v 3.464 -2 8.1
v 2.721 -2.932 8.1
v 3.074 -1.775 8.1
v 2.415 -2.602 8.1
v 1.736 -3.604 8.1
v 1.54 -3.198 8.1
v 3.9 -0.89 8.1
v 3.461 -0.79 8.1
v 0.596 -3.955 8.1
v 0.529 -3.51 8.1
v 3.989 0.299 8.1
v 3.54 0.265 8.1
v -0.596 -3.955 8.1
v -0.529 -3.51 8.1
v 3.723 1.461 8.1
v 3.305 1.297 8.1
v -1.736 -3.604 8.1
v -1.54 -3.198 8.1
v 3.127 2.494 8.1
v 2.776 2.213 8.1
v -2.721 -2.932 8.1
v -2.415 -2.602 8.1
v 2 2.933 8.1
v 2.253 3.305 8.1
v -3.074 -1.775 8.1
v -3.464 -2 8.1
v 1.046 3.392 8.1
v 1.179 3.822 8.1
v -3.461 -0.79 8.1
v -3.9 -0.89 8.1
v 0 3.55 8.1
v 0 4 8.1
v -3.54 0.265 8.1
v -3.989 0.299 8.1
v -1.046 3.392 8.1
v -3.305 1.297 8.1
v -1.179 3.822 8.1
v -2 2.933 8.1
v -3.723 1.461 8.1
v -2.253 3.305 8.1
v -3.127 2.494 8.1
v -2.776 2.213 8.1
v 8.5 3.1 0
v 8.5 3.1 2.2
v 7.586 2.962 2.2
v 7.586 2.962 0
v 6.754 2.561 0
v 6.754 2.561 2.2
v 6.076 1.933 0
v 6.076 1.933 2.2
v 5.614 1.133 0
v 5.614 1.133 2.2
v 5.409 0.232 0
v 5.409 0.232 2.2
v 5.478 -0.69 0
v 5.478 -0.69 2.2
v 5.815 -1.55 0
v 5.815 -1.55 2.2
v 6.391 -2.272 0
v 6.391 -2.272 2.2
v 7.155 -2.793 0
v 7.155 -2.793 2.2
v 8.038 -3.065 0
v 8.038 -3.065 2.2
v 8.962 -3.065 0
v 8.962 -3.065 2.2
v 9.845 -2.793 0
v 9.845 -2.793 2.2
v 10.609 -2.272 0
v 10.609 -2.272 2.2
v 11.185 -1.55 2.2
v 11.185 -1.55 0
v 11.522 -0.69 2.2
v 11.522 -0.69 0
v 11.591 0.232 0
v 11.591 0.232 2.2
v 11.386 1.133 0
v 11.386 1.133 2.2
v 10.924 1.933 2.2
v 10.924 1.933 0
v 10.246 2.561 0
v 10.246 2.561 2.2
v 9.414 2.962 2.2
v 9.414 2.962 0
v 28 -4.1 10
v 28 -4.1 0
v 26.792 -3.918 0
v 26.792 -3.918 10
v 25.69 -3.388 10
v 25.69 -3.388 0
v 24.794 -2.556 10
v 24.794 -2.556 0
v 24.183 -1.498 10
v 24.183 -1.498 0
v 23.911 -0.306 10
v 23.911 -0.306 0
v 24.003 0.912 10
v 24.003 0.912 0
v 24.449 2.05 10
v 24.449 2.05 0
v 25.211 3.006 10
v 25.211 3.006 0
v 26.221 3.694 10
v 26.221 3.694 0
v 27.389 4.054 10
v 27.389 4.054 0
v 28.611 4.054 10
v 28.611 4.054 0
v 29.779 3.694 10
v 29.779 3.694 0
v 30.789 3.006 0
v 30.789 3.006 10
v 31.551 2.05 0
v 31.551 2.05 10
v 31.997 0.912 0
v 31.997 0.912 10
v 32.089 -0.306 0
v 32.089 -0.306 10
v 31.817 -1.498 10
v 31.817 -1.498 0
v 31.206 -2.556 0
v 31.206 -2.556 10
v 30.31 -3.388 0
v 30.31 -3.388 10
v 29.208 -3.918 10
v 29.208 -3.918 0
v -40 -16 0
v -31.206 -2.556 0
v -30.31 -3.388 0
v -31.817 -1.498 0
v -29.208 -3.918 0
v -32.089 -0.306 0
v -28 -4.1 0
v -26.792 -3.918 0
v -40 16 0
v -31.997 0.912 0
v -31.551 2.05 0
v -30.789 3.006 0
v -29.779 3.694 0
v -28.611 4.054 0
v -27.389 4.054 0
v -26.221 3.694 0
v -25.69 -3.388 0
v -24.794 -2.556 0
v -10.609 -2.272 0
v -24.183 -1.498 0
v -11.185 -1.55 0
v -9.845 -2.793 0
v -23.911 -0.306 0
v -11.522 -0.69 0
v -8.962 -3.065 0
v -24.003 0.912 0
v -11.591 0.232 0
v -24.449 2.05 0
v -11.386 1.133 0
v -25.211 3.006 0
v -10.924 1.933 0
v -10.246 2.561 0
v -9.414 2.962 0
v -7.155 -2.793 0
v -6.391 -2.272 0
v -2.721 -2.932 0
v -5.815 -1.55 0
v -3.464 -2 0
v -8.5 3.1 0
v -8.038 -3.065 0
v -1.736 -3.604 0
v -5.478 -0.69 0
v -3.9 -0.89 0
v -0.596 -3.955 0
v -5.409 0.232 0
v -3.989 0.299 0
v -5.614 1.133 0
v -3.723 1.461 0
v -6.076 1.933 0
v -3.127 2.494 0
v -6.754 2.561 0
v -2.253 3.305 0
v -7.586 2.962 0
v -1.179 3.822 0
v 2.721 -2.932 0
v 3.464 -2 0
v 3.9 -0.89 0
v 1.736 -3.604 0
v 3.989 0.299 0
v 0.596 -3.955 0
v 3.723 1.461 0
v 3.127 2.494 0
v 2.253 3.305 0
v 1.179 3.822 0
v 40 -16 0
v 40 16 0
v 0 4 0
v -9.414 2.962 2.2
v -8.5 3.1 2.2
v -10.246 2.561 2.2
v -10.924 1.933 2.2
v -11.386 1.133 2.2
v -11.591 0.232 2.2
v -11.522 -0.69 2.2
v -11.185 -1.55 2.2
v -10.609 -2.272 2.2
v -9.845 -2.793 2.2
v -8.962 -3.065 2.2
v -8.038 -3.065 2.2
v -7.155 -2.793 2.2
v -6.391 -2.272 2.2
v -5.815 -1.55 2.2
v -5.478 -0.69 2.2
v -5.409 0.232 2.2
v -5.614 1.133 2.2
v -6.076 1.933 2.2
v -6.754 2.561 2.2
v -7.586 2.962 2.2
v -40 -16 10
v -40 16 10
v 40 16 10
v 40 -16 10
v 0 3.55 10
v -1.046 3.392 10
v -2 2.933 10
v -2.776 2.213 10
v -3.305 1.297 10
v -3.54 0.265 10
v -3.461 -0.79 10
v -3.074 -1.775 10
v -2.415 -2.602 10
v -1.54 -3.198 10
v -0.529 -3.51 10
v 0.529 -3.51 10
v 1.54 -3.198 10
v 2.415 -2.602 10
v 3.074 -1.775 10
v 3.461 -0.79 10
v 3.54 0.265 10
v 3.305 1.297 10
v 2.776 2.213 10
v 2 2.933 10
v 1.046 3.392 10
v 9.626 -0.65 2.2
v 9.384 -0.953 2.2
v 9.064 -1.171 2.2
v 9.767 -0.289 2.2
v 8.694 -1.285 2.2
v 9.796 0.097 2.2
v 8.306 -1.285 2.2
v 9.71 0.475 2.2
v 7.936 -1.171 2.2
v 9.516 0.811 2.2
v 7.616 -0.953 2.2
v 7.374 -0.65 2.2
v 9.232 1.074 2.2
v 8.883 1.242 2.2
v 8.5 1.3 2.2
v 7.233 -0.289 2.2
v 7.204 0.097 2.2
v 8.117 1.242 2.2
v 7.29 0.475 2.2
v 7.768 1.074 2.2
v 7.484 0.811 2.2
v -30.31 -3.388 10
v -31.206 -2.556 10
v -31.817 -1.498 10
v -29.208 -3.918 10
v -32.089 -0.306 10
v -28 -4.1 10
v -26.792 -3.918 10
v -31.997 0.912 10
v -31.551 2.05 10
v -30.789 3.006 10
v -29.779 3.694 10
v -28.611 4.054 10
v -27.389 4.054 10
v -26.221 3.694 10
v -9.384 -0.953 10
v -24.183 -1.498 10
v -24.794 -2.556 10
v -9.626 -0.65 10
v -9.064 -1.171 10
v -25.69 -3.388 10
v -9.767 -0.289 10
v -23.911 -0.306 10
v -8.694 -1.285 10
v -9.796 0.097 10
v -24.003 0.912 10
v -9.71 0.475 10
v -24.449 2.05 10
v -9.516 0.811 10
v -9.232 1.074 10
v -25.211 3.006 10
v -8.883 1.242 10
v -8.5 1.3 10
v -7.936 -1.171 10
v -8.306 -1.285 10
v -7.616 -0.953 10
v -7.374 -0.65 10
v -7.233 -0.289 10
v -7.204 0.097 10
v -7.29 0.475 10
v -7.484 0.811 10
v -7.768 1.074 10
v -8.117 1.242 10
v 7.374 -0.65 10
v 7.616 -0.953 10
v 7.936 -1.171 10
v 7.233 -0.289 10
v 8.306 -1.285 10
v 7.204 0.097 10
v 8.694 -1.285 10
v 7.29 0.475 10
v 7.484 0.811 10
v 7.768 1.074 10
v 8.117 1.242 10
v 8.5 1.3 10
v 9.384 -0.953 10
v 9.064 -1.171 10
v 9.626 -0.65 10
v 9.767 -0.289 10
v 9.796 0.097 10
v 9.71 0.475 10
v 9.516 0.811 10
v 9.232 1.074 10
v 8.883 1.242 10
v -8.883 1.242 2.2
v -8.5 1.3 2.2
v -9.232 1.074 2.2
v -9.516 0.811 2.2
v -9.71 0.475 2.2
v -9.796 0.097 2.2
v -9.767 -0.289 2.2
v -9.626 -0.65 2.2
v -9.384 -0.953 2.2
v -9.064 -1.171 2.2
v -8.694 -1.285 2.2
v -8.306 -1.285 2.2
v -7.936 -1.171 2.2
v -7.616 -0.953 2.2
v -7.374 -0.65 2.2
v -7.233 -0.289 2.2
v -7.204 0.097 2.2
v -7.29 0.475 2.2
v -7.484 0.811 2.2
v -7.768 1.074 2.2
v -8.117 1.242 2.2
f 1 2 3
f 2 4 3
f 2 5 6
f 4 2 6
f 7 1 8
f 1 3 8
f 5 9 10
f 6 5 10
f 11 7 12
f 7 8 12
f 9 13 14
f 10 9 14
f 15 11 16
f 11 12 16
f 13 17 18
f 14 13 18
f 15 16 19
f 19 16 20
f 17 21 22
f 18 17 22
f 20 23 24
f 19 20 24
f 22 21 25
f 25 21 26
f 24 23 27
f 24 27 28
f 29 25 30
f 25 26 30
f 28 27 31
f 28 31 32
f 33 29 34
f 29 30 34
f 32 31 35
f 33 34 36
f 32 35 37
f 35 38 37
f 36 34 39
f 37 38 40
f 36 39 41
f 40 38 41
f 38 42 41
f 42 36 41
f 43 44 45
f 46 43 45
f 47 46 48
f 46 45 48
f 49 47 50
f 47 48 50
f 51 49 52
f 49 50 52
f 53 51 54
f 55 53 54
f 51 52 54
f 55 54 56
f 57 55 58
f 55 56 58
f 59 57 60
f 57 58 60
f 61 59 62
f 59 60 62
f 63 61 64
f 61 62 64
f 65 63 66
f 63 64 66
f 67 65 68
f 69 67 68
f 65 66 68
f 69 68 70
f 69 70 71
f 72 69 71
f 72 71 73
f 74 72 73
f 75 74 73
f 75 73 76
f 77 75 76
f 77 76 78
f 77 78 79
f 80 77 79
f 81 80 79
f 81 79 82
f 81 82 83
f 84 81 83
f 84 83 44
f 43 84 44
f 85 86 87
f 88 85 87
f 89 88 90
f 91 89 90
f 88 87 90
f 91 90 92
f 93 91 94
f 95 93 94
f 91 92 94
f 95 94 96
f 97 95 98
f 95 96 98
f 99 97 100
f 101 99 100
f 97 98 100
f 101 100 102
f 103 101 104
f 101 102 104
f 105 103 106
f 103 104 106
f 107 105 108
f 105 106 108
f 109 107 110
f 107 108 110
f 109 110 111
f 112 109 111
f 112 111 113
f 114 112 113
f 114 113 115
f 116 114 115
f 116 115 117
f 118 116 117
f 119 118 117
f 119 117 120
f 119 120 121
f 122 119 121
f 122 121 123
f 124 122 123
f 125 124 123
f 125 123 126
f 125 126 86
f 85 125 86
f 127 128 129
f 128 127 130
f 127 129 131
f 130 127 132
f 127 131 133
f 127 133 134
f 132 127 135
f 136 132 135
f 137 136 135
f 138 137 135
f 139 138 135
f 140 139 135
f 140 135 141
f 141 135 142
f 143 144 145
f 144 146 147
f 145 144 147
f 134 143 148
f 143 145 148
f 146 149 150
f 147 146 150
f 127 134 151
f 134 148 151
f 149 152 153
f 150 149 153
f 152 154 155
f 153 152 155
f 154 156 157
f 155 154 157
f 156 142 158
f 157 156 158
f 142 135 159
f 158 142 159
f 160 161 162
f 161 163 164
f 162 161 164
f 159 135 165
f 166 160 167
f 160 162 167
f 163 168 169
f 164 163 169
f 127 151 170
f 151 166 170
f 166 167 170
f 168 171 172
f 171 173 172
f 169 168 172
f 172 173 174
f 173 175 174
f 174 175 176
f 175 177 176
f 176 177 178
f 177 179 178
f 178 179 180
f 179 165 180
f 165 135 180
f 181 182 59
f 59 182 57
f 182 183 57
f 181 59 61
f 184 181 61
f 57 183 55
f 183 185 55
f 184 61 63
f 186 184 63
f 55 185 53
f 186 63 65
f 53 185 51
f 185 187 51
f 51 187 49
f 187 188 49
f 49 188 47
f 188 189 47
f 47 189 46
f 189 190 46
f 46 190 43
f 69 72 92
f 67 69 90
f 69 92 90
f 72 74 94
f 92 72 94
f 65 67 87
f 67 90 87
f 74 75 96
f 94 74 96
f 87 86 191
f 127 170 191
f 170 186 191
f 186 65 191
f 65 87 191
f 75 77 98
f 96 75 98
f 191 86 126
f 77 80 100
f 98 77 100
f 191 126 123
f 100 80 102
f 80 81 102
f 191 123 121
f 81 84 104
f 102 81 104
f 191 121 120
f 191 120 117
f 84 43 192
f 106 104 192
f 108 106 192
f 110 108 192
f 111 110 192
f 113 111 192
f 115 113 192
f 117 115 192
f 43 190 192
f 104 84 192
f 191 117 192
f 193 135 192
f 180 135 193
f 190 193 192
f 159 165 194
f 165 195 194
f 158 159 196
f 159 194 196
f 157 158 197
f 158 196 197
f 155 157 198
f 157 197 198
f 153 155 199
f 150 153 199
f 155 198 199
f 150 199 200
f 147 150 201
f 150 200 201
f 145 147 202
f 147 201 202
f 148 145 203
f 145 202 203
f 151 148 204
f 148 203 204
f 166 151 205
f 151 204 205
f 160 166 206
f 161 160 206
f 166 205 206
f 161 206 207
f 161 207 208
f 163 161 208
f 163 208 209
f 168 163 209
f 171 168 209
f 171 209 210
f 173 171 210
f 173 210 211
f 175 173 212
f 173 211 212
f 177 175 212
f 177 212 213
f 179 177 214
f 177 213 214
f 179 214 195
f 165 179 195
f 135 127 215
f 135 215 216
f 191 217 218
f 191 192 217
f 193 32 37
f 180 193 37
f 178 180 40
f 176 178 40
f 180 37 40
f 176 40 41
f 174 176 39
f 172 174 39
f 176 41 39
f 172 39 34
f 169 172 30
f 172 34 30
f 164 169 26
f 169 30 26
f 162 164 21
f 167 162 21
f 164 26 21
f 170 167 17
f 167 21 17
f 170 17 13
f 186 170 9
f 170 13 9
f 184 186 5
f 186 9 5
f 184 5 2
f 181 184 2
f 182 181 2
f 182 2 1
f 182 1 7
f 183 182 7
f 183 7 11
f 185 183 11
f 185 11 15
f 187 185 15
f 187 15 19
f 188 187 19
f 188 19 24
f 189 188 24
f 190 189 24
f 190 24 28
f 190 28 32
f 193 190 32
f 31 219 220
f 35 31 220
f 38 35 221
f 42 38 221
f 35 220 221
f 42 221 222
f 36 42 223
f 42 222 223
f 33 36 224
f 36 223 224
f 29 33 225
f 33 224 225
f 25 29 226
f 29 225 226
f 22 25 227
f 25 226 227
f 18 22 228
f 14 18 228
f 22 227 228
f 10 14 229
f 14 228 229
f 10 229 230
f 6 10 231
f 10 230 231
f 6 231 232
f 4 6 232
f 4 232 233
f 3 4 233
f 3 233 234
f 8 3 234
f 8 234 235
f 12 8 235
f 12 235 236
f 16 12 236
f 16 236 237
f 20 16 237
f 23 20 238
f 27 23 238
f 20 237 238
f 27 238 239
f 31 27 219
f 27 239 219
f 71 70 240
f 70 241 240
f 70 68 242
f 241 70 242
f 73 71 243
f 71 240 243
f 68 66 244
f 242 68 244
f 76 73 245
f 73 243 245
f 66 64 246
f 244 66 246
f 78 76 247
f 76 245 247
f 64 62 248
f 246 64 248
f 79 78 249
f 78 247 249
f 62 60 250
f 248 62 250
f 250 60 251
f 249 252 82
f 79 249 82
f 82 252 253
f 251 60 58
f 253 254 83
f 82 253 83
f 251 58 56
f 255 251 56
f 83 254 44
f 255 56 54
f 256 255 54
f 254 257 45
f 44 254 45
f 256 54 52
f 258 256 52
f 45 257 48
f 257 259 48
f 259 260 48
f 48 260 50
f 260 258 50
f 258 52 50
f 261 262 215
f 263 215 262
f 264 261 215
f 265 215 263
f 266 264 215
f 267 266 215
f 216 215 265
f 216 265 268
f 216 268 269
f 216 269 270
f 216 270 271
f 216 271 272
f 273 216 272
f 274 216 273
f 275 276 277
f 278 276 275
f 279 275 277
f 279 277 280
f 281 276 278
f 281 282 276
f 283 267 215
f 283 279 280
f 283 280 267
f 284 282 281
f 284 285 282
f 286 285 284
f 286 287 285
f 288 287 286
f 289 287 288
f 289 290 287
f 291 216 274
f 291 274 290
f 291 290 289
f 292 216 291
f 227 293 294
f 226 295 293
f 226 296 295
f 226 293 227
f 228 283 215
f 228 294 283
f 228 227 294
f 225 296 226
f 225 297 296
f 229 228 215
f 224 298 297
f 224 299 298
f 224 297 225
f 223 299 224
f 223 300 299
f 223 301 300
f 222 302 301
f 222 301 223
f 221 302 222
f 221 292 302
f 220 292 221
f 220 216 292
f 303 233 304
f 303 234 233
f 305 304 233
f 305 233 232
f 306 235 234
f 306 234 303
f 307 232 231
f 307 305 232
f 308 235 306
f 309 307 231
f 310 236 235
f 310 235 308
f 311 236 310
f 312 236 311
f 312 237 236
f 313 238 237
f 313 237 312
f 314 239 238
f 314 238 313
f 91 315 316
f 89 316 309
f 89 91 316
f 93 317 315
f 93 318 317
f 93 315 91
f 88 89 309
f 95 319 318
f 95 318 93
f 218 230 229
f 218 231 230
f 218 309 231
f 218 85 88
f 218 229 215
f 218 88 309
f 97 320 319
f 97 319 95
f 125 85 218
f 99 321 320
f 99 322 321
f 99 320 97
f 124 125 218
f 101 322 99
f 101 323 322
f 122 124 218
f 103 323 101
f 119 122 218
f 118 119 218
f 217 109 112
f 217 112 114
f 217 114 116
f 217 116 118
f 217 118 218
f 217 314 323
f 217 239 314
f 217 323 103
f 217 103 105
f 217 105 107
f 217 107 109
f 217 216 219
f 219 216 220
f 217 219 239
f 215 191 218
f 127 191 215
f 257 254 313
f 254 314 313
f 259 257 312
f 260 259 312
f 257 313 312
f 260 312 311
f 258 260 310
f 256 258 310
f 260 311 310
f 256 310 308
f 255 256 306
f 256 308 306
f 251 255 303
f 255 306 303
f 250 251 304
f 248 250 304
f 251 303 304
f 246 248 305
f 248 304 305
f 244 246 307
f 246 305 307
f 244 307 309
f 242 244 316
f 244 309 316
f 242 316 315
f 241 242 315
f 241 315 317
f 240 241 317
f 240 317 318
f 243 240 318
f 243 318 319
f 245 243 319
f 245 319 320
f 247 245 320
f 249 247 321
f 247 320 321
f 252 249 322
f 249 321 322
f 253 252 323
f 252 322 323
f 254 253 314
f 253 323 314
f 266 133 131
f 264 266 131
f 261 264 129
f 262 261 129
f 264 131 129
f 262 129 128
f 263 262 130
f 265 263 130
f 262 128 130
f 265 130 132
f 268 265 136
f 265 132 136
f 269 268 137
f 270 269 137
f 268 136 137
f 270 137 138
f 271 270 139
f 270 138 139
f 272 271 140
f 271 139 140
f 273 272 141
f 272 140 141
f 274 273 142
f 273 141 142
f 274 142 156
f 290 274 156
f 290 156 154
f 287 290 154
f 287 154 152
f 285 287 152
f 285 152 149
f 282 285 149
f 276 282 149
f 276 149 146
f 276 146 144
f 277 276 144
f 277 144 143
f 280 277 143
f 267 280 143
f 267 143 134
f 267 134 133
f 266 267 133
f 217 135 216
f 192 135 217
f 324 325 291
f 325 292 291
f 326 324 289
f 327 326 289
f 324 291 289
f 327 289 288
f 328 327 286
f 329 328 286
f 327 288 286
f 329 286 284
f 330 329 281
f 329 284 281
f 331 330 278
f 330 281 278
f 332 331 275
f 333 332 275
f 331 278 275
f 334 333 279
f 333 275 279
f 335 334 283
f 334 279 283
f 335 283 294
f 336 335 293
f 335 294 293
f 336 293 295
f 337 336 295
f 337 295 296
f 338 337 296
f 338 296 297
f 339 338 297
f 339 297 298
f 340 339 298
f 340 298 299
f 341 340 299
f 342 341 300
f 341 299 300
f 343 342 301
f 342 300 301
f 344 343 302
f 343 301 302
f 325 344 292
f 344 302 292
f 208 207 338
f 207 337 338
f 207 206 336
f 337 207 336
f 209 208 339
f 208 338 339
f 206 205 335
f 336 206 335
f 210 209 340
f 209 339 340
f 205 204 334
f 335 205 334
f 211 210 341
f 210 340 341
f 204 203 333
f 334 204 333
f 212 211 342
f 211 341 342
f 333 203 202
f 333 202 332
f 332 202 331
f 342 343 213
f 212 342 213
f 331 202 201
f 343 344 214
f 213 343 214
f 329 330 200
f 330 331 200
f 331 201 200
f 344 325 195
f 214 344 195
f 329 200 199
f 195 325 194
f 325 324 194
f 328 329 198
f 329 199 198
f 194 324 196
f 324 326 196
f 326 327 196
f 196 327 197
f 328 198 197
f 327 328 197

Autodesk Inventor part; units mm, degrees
ref_plane "YZ Plane" through (0, 0, 0) normal (1, 0, 0) x (0, 1, 0)
ref_plane "XZ Plane" through (0, 0, 0) normal (0, 1, 0) x (-1, 0, 0)
ref_plane "XY Plane" through (0, 0, 0) normal (0, 0, 1) x (1, 0, 0)
sketch "Sketch1" plane through (0, 0, 0) normal (0, 0, 1) x (1, 0, 0)
  line L0 (-40, 16) -> (40, 16)
  line L1 (40, 16) -> (40, -16)
  line L2 (40, -16) -> (-40, -16)
  line L3 (-40, -16) -> (-40, 16)
  line L4 (-40, 16) -> (40, -16) construction
  line L5 (40, 16) -> (-40, -16) construction
  point P0 (0, 0)
  dimension "d0" = 80
  dimension "d1" = 32
extrude "Extrusion1" add sketch "Sketch1" along normal blind 10
sketch "Sketch2" plane through (0, 0, 10) normal (0, 0, 1) x (1, 0, 0)
  line L0 (-28, 0) -> (-40, 0)
  line L1 (-40, 16) -> (-40, -16) projected
  line L2 (28, 0) -> (40, 0)
  line L3 (40, -16) -> (40, 16) projected
  point P0 (0, 0)
  dimension "d4" = 56
hole "Hole1" at (28, 0, 10) at (-28, 0, 10) direction (0, 0, -1) diameter 8.2 end through all
sketch "Sketch4" plane through (0, 0, 0) normal (0, 0, -1) x (-1, 0, 0)
  line L0 (-8.5, 0) -> (-40, 0) construction
  line L1 (8.5, 0) -> (40, 0) construction
  line L2 (40, 16) -> (40, -16) projected
  line L3 (-40, -16) -> (-40, 16) projected
  line L4 (-40, 0) -> (40, 0)
  point P0 (0, 0)
  dimension "d13" = 8.5
hole "Hole2" at (-8.5, 0, 0) at (8.5, 0, 0) direction (0, 0, 1) diameter 2.6 end through all counterbore diameter 6.2 counterbore depth 2.2
sketch "Sketch5" plane through (0, 0, 0) normal (0, 0, -1) x (-1, 0, 0)
  point P0 (0, 0)
  point P1 (0, 0)
hole "Hole3" at (0, 0, 0) direction (0, 0, 1) diameter 7.1 end through all counterbore diameter 8 counterbore depth 8.1
properties part number "13042026-09"
